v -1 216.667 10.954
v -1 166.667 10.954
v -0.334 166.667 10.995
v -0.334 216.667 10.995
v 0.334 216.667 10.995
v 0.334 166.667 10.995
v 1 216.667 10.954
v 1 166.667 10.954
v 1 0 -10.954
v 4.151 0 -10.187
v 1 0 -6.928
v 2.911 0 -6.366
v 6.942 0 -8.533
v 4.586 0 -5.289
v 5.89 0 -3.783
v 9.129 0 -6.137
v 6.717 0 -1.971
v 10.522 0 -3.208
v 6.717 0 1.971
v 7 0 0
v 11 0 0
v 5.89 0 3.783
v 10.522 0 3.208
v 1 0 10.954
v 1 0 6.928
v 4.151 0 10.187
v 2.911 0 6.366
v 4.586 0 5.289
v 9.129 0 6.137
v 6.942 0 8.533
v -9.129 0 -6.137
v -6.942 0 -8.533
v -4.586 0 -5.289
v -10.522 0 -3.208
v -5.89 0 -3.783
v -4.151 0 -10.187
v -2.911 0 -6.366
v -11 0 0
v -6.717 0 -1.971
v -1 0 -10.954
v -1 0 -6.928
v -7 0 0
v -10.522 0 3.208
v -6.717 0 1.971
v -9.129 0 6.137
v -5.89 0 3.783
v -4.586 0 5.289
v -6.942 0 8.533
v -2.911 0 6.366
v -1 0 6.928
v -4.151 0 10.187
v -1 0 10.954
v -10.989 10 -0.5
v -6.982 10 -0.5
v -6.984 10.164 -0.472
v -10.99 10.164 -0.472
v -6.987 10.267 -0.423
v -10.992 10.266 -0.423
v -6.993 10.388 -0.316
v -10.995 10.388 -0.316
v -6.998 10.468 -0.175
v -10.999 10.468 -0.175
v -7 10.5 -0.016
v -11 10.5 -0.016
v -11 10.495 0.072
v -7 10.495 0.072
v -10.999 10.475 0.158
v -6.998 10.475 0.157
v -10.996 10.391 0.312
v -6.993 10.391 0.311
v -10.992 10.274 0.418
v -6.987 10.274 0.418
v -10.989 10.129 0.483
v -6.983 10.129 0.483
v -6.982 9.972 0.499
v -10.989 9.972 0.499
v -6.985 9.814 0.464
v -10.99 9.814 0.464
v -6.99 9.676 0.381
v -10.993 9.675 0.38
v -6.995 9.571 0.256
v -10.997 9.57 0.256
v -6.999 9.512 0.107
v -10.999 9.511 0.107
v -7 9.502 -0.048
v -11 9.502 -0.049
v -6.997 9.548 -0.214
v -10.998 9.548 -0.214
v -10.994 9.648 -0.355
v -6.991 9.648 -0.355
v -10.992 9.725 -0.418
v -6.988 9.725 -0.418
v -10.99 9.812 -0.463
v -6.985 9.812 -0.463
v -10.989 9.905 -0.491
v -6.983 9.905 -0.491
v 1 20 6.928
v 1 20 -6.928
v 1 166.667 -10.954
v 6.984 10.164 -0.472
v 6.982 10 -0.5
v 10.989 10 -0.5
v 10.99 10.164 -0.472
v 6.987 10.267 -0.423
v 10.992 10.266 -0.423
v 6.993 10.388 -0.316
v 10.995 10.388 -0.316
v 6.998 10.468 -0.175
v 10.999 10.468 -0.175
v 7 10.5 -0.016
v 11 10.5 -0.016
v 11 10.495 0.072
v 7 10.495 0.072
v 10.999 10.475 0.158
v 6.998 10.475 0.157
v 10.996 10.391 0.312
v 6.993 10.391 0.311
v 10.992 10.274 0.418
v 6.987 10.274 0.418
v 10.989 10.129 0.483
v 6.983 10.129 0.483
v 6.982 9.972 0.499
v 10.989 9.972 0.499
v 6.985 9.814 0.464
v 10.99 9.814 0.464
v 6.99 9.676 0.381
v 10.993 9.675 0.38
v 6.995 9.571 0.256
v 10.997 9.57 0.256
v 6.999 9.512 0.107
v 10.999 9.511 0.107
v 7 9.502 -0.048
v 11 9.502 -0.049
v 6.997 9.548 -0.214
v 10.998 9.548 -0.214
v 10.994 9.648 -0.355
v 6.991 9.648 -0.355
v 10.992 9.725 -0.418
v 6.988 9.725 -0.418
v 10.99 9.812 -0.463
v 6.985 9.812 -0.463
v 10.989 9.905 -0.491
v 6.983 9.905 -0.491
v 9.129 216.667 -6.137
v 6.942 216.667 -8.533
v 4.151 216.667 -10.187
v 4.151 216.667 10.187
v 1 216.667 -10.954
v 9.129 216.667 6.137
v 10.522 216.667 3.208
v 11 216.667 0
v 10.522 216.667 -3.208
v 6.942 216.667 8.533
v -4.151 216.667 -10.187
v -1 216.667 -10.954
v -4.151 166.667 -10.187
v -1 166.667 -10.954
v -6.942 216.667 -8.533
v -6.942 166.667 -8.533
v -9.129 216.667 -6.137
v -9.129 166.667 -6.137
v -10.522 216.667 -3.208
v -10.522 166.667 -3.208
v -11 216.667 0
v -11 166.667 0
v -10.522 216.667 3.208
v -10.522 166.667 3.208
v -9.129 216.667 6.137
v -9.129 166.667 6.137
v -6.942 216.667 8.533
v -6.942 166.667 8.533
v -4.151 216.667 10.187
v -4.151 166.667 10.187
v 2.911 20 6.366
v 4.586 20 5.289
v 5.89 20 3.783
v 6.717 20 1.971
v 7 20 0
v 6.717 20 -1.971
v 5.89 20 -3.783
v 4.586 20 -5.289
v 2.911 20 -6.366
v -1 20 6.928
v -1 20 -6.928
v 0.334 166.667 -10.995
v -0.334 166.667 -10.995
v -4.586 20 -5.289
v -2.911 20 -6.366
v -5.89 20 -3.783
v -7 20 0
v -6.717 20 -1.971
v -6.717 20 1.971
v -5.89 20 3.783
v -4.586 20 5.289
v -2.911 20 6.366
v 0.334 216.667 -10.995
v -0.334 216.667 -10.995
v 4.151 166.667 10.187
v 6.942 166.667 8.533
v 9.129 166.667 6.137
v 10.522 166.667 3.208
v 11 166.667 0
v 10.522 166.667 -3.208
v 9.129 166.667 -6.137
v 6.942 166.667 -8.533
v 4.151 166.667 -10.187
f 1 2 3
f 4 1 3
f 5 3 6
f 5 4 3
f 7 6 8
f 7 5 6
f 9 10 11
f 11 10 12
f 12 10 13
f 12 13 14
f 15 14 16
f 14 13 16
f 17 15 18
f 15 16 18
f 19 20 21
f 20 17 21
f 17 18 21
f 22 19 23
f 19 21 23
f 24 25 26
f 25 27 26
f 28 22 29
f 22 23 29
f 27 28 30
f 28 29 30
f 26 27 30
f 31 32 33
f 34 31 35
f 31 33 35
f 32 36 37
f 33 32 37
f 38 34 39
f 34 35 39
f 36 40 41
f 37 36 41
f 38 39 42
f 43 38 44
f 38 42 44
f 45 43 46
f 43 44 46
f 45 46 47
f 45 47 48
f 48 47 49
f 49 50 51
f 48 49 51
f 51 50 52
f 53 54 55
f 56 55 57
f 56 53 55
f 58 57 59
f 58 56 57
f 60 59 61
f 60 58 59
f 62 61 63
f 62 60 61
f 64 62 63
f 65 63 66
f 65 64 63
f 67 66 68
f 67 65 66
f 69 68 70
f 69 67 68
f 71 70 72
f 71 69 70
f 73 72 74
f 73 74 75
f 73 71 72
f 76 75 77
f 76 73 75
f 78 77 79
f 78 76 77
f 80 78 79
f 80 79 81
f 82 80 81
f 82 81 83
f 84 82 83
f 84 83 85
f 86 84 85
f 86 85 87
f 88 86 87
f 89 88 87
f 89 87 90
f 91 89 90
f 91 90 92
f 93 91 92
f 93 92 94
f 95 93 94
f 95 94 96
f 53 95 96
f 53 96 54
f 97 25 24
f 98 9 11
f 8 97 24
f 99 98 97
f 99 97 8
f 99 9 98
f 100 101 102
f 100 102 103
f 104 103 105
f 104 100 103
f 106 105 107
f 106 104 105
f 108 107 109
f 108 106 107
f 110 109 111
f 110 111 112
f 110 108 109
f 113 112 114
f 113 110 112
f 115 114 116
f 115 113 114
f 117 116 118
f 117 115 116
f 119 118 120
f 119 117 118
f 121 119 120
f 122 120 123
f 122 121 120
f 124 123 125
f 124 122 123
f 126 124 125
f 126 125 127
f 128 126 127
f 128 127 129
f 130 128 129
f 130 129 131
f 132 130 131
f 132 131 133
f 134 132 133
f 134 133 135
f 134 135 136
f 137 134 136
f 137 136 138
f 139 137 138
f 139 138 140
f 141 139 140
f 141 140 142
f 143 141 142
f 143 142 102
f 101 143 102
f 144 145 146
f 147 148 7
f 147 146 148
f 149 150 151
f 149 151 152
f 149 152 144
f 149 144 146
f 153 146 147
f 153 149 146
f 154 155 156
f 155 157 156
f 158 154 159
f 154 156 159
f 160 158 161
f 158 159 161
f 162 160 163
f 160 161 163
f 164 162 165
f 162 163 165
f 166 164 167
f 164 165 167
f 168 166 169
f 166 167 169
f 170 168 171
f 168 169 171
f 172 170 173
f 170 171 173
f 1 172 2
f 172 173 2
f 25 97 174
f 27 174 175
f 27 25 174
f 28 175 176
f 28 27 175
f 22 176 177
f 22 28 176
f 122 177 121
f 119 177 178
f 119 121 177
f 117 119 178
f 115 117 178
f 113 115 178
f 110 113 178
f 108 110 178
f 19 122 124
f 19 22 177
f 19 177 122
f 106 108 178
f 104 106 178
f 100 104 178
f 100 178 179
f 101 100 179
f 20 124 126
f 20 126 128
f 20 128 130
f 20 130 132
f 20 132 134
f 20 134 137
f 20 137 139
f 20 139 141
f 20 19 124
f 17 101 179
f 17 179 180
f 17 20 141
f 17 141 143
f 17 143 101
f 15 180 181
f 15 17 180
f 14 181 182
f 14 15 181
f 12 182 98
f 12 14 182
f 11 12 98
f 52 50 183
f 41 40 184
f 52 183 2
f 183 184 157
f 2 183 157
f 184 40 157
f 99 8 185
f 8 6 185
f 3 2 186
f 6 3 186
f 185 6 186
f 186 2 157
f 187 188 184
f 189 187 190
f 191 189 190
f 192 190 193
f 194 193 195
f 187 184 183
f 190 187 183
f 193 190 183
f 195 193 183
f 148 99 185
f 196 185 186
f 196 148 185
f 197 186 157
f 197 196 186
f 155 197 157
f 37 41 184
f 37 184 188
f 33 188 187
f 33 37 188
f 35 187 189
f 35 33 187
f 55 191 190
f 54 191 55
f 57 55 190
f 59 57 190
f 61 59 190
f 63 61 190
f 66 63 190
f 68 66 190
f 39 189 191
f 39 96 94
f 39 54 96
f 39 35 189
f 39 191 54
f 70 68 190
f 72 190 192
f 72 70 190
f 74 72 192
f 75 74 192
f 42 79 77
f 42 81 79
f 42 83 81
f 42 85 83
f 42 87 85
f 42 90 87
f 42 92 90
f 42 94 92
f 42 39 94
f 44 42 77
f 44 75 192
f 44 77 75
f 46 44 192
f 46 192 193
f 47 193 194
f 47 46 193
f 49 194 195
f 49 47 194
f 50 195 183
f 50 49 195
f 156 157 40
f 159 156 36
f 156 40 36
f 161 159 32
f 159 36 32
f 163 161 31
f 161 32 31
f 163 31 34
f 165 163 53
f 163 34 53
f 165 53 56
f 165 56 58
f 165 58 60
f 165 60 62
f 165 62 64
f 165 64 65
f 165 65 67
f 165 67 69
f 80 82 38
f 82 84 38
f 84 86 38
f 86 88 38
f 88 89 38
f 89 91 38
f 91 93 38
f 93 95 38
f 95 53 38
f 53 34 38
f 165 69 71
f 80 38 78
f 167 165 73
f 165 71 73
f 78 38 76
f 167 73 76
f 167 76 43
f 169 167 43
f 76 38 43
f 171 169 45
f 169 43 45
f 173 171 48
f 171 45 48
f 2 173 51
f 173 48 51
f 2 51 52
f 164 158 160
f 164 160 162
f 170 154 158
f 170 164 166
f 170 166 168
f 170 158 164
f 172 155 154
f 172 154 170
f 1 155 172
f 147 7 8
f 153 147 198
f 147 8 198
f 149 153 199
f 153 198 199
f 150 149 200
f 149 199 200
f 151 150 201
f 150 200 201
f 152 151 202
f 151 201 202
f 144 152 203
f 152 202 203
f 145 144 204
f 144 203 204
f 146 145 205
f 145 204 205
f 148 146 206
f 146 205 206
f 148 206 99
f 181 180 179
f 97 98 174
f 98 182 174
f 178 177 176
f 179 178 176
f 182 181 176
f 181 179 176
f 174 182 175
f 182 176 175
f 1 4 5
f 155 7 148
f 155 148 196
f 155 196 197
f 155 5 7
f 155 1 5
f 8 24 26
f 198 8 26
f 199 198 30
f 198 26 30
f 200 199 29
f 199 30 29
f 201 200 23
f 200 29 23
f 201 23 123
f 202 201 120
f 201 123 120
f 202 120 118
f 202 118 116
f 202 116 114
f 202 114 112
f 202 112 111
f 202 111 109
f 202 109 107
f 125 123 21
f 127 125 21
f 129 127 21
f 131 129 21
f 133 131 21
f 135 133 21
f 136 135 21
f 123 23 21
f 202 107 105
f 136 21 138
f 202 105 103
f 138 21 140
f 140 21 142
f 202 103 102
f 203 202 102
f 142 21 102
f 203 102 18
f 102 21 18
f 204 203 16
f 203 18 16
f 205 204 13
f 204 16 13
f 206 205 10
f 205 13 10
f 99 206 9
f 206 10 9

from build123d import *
from build123d.topology import SkipClean

# Parameters (mm, degrees)
SKETCH1_R               = 11
BOSS_EXTRUDE1_DEPTH     = 216.66667
SKETCH6_R               = 7
CUT_EXTRUDE3_DEPTH      = 20
CUT_EXTRUDE4_DEPTH      = 218.224413658
CUT_EXTRUDE4_DEPTH_BACK = 218.224413658
SKETCH7_R               = 0.5
CUT_EXTRUDE5_DEPTH      = 218.224413767
CUT_EXTRUDE5_DEPTH_BACK = 218.224413767
SKETCH10_R              = 0.5
CUT_EXTRUDE6_DEPTH      = 218.224413767
CUT_EXTRUDE6_DEPTH_BACK = 218.224413767
SKETCH11_W              = 2
SKETCH11_H              = 216.66667
BOSS_EXTRUDE4_START     = 216.66667
SKETCH16_R              = 11
BOSS_EXTRUDE4_DEPTH     = 50


with BuildPart() as part:
    # Sketch1 → Boss-Extrude1 (new body)
    with BuildSketch(Plane(origin=(0, 0, 0), x_dir=(1, 0, 0), z_dir=(0, 1, 0))):
        with Locations(Location((0, 0, 0), (0, 0, 270))):
            Circle(SKETCH1_R)
    extrude(amount=BOSS_EXTRUDE1_DEPTH)

    # Sketch6 → Cut-Extrude3 (cut)
    with BuildSketch(Plane(origin=(0, 0, 0), x_dir=(1, 0, 0), z_dir=(0, 1, 0))):
        with Locations(Location((0, 0, 0), (0, 0, 270))):
            Circle(SKETCH6_R)
    extrude(amount=CUT_EXTRUDE3_DEPTH, mode=Mode.SUBTRACT)

    # Sketch7 → Cut-Extrude4 (cut, two sides: drawn at the far end of the back side and taken through both)
    with BuildSketch(Plane(origin=(0, 0, 0), x_dir=(0, 0, -1), z_dir=(1, 0, 0)).offset(-CUT_EXTRUDE4_DEPTH_BACK)):
        with Locations((0, 10)):
            Circle(SKETCH7_R)
    extrude(amount=CUT_EXTRUDE4_DEPTH + CUT_EXTRUDE4_DEPTH_BACK, mode=Mode.SUBTRACT)

    # Sketch10 → Cut-Extrude5 (cut, two sides: drawn at the far end of the back side and taken through both)
    with BuildSketch(Plane.XY.offset(-CUT_EXTRUDE5_DEPTH_BACK)):
        with Locations((0, 5)):
            Circle(SKETCH10_R)
    extrude(amount=CUT_EXTRUDE5_DEPTH + CUT_EXTRUDE5_DEPTH_BACK, mode=Mode.SUBTRACT)

    # Sketch11 → Cut-Extrude6 (cut, two sides: drawn at the far end of the back side and taken through both)
    with BuildSketch(Plane.XY.offset(-CUT_EXTRUDE6_DEPTH_BACK)):
        with Locations((0, 108.333335)):
            Rectangle(SKETCH11_W, SKETCH11_H)
    extrude(amount=CUT_EXTRUDE6_DEPTH + CUT_EXTRUDE6_DEPTH_BACK, mode=Mode.SUBTRACT)


with BuildPart() as cut_extrude6_piece_1:
    # of the separate pieces the step leaves, piece 1, a body of its own (cut_extrude6_pieces)
    add(part.part.solids().sort_by_distance((-1, 0, -10.95445115))[0])



with BuildPart() as cut_extrude6_piece_2:
    # of the separate pieces the step leaves, piece 2, a body of its own (cut_extrude6_pieces)
    add(part.part.solids().sort_by_distance((1, 0, 10.95445115))[0])


with BuildPart() as cut_extrude6_piece_1_1:
    with SkipClean():  # the faces are left unmerged after this step: merging them gives an invalid solid
        add(cut_extrude6_piece_1.part)

        add(cut_extrude6_piece_2.part)  # Boss-Extrude4 merges Cut-Extrude6 piece 2
        # Sketch16 → Boss-Extrude4 (add)
        with BuildSketch(Plane(origin=(0, 0, 0), x_dir=(1, 0, 0), z_dir=(0, 1, 0)).offset(BOSS_EXTRUDE4_START)):
            with Locations(Location((0, 0, 0), (0, 0, 84.78409143))):
                Circle(SKETCH16_R)
        extrude(amount=-BOSS_EXTRUDE4_DEPTH)


solid = cut_extrude6_piece_1_1.part
